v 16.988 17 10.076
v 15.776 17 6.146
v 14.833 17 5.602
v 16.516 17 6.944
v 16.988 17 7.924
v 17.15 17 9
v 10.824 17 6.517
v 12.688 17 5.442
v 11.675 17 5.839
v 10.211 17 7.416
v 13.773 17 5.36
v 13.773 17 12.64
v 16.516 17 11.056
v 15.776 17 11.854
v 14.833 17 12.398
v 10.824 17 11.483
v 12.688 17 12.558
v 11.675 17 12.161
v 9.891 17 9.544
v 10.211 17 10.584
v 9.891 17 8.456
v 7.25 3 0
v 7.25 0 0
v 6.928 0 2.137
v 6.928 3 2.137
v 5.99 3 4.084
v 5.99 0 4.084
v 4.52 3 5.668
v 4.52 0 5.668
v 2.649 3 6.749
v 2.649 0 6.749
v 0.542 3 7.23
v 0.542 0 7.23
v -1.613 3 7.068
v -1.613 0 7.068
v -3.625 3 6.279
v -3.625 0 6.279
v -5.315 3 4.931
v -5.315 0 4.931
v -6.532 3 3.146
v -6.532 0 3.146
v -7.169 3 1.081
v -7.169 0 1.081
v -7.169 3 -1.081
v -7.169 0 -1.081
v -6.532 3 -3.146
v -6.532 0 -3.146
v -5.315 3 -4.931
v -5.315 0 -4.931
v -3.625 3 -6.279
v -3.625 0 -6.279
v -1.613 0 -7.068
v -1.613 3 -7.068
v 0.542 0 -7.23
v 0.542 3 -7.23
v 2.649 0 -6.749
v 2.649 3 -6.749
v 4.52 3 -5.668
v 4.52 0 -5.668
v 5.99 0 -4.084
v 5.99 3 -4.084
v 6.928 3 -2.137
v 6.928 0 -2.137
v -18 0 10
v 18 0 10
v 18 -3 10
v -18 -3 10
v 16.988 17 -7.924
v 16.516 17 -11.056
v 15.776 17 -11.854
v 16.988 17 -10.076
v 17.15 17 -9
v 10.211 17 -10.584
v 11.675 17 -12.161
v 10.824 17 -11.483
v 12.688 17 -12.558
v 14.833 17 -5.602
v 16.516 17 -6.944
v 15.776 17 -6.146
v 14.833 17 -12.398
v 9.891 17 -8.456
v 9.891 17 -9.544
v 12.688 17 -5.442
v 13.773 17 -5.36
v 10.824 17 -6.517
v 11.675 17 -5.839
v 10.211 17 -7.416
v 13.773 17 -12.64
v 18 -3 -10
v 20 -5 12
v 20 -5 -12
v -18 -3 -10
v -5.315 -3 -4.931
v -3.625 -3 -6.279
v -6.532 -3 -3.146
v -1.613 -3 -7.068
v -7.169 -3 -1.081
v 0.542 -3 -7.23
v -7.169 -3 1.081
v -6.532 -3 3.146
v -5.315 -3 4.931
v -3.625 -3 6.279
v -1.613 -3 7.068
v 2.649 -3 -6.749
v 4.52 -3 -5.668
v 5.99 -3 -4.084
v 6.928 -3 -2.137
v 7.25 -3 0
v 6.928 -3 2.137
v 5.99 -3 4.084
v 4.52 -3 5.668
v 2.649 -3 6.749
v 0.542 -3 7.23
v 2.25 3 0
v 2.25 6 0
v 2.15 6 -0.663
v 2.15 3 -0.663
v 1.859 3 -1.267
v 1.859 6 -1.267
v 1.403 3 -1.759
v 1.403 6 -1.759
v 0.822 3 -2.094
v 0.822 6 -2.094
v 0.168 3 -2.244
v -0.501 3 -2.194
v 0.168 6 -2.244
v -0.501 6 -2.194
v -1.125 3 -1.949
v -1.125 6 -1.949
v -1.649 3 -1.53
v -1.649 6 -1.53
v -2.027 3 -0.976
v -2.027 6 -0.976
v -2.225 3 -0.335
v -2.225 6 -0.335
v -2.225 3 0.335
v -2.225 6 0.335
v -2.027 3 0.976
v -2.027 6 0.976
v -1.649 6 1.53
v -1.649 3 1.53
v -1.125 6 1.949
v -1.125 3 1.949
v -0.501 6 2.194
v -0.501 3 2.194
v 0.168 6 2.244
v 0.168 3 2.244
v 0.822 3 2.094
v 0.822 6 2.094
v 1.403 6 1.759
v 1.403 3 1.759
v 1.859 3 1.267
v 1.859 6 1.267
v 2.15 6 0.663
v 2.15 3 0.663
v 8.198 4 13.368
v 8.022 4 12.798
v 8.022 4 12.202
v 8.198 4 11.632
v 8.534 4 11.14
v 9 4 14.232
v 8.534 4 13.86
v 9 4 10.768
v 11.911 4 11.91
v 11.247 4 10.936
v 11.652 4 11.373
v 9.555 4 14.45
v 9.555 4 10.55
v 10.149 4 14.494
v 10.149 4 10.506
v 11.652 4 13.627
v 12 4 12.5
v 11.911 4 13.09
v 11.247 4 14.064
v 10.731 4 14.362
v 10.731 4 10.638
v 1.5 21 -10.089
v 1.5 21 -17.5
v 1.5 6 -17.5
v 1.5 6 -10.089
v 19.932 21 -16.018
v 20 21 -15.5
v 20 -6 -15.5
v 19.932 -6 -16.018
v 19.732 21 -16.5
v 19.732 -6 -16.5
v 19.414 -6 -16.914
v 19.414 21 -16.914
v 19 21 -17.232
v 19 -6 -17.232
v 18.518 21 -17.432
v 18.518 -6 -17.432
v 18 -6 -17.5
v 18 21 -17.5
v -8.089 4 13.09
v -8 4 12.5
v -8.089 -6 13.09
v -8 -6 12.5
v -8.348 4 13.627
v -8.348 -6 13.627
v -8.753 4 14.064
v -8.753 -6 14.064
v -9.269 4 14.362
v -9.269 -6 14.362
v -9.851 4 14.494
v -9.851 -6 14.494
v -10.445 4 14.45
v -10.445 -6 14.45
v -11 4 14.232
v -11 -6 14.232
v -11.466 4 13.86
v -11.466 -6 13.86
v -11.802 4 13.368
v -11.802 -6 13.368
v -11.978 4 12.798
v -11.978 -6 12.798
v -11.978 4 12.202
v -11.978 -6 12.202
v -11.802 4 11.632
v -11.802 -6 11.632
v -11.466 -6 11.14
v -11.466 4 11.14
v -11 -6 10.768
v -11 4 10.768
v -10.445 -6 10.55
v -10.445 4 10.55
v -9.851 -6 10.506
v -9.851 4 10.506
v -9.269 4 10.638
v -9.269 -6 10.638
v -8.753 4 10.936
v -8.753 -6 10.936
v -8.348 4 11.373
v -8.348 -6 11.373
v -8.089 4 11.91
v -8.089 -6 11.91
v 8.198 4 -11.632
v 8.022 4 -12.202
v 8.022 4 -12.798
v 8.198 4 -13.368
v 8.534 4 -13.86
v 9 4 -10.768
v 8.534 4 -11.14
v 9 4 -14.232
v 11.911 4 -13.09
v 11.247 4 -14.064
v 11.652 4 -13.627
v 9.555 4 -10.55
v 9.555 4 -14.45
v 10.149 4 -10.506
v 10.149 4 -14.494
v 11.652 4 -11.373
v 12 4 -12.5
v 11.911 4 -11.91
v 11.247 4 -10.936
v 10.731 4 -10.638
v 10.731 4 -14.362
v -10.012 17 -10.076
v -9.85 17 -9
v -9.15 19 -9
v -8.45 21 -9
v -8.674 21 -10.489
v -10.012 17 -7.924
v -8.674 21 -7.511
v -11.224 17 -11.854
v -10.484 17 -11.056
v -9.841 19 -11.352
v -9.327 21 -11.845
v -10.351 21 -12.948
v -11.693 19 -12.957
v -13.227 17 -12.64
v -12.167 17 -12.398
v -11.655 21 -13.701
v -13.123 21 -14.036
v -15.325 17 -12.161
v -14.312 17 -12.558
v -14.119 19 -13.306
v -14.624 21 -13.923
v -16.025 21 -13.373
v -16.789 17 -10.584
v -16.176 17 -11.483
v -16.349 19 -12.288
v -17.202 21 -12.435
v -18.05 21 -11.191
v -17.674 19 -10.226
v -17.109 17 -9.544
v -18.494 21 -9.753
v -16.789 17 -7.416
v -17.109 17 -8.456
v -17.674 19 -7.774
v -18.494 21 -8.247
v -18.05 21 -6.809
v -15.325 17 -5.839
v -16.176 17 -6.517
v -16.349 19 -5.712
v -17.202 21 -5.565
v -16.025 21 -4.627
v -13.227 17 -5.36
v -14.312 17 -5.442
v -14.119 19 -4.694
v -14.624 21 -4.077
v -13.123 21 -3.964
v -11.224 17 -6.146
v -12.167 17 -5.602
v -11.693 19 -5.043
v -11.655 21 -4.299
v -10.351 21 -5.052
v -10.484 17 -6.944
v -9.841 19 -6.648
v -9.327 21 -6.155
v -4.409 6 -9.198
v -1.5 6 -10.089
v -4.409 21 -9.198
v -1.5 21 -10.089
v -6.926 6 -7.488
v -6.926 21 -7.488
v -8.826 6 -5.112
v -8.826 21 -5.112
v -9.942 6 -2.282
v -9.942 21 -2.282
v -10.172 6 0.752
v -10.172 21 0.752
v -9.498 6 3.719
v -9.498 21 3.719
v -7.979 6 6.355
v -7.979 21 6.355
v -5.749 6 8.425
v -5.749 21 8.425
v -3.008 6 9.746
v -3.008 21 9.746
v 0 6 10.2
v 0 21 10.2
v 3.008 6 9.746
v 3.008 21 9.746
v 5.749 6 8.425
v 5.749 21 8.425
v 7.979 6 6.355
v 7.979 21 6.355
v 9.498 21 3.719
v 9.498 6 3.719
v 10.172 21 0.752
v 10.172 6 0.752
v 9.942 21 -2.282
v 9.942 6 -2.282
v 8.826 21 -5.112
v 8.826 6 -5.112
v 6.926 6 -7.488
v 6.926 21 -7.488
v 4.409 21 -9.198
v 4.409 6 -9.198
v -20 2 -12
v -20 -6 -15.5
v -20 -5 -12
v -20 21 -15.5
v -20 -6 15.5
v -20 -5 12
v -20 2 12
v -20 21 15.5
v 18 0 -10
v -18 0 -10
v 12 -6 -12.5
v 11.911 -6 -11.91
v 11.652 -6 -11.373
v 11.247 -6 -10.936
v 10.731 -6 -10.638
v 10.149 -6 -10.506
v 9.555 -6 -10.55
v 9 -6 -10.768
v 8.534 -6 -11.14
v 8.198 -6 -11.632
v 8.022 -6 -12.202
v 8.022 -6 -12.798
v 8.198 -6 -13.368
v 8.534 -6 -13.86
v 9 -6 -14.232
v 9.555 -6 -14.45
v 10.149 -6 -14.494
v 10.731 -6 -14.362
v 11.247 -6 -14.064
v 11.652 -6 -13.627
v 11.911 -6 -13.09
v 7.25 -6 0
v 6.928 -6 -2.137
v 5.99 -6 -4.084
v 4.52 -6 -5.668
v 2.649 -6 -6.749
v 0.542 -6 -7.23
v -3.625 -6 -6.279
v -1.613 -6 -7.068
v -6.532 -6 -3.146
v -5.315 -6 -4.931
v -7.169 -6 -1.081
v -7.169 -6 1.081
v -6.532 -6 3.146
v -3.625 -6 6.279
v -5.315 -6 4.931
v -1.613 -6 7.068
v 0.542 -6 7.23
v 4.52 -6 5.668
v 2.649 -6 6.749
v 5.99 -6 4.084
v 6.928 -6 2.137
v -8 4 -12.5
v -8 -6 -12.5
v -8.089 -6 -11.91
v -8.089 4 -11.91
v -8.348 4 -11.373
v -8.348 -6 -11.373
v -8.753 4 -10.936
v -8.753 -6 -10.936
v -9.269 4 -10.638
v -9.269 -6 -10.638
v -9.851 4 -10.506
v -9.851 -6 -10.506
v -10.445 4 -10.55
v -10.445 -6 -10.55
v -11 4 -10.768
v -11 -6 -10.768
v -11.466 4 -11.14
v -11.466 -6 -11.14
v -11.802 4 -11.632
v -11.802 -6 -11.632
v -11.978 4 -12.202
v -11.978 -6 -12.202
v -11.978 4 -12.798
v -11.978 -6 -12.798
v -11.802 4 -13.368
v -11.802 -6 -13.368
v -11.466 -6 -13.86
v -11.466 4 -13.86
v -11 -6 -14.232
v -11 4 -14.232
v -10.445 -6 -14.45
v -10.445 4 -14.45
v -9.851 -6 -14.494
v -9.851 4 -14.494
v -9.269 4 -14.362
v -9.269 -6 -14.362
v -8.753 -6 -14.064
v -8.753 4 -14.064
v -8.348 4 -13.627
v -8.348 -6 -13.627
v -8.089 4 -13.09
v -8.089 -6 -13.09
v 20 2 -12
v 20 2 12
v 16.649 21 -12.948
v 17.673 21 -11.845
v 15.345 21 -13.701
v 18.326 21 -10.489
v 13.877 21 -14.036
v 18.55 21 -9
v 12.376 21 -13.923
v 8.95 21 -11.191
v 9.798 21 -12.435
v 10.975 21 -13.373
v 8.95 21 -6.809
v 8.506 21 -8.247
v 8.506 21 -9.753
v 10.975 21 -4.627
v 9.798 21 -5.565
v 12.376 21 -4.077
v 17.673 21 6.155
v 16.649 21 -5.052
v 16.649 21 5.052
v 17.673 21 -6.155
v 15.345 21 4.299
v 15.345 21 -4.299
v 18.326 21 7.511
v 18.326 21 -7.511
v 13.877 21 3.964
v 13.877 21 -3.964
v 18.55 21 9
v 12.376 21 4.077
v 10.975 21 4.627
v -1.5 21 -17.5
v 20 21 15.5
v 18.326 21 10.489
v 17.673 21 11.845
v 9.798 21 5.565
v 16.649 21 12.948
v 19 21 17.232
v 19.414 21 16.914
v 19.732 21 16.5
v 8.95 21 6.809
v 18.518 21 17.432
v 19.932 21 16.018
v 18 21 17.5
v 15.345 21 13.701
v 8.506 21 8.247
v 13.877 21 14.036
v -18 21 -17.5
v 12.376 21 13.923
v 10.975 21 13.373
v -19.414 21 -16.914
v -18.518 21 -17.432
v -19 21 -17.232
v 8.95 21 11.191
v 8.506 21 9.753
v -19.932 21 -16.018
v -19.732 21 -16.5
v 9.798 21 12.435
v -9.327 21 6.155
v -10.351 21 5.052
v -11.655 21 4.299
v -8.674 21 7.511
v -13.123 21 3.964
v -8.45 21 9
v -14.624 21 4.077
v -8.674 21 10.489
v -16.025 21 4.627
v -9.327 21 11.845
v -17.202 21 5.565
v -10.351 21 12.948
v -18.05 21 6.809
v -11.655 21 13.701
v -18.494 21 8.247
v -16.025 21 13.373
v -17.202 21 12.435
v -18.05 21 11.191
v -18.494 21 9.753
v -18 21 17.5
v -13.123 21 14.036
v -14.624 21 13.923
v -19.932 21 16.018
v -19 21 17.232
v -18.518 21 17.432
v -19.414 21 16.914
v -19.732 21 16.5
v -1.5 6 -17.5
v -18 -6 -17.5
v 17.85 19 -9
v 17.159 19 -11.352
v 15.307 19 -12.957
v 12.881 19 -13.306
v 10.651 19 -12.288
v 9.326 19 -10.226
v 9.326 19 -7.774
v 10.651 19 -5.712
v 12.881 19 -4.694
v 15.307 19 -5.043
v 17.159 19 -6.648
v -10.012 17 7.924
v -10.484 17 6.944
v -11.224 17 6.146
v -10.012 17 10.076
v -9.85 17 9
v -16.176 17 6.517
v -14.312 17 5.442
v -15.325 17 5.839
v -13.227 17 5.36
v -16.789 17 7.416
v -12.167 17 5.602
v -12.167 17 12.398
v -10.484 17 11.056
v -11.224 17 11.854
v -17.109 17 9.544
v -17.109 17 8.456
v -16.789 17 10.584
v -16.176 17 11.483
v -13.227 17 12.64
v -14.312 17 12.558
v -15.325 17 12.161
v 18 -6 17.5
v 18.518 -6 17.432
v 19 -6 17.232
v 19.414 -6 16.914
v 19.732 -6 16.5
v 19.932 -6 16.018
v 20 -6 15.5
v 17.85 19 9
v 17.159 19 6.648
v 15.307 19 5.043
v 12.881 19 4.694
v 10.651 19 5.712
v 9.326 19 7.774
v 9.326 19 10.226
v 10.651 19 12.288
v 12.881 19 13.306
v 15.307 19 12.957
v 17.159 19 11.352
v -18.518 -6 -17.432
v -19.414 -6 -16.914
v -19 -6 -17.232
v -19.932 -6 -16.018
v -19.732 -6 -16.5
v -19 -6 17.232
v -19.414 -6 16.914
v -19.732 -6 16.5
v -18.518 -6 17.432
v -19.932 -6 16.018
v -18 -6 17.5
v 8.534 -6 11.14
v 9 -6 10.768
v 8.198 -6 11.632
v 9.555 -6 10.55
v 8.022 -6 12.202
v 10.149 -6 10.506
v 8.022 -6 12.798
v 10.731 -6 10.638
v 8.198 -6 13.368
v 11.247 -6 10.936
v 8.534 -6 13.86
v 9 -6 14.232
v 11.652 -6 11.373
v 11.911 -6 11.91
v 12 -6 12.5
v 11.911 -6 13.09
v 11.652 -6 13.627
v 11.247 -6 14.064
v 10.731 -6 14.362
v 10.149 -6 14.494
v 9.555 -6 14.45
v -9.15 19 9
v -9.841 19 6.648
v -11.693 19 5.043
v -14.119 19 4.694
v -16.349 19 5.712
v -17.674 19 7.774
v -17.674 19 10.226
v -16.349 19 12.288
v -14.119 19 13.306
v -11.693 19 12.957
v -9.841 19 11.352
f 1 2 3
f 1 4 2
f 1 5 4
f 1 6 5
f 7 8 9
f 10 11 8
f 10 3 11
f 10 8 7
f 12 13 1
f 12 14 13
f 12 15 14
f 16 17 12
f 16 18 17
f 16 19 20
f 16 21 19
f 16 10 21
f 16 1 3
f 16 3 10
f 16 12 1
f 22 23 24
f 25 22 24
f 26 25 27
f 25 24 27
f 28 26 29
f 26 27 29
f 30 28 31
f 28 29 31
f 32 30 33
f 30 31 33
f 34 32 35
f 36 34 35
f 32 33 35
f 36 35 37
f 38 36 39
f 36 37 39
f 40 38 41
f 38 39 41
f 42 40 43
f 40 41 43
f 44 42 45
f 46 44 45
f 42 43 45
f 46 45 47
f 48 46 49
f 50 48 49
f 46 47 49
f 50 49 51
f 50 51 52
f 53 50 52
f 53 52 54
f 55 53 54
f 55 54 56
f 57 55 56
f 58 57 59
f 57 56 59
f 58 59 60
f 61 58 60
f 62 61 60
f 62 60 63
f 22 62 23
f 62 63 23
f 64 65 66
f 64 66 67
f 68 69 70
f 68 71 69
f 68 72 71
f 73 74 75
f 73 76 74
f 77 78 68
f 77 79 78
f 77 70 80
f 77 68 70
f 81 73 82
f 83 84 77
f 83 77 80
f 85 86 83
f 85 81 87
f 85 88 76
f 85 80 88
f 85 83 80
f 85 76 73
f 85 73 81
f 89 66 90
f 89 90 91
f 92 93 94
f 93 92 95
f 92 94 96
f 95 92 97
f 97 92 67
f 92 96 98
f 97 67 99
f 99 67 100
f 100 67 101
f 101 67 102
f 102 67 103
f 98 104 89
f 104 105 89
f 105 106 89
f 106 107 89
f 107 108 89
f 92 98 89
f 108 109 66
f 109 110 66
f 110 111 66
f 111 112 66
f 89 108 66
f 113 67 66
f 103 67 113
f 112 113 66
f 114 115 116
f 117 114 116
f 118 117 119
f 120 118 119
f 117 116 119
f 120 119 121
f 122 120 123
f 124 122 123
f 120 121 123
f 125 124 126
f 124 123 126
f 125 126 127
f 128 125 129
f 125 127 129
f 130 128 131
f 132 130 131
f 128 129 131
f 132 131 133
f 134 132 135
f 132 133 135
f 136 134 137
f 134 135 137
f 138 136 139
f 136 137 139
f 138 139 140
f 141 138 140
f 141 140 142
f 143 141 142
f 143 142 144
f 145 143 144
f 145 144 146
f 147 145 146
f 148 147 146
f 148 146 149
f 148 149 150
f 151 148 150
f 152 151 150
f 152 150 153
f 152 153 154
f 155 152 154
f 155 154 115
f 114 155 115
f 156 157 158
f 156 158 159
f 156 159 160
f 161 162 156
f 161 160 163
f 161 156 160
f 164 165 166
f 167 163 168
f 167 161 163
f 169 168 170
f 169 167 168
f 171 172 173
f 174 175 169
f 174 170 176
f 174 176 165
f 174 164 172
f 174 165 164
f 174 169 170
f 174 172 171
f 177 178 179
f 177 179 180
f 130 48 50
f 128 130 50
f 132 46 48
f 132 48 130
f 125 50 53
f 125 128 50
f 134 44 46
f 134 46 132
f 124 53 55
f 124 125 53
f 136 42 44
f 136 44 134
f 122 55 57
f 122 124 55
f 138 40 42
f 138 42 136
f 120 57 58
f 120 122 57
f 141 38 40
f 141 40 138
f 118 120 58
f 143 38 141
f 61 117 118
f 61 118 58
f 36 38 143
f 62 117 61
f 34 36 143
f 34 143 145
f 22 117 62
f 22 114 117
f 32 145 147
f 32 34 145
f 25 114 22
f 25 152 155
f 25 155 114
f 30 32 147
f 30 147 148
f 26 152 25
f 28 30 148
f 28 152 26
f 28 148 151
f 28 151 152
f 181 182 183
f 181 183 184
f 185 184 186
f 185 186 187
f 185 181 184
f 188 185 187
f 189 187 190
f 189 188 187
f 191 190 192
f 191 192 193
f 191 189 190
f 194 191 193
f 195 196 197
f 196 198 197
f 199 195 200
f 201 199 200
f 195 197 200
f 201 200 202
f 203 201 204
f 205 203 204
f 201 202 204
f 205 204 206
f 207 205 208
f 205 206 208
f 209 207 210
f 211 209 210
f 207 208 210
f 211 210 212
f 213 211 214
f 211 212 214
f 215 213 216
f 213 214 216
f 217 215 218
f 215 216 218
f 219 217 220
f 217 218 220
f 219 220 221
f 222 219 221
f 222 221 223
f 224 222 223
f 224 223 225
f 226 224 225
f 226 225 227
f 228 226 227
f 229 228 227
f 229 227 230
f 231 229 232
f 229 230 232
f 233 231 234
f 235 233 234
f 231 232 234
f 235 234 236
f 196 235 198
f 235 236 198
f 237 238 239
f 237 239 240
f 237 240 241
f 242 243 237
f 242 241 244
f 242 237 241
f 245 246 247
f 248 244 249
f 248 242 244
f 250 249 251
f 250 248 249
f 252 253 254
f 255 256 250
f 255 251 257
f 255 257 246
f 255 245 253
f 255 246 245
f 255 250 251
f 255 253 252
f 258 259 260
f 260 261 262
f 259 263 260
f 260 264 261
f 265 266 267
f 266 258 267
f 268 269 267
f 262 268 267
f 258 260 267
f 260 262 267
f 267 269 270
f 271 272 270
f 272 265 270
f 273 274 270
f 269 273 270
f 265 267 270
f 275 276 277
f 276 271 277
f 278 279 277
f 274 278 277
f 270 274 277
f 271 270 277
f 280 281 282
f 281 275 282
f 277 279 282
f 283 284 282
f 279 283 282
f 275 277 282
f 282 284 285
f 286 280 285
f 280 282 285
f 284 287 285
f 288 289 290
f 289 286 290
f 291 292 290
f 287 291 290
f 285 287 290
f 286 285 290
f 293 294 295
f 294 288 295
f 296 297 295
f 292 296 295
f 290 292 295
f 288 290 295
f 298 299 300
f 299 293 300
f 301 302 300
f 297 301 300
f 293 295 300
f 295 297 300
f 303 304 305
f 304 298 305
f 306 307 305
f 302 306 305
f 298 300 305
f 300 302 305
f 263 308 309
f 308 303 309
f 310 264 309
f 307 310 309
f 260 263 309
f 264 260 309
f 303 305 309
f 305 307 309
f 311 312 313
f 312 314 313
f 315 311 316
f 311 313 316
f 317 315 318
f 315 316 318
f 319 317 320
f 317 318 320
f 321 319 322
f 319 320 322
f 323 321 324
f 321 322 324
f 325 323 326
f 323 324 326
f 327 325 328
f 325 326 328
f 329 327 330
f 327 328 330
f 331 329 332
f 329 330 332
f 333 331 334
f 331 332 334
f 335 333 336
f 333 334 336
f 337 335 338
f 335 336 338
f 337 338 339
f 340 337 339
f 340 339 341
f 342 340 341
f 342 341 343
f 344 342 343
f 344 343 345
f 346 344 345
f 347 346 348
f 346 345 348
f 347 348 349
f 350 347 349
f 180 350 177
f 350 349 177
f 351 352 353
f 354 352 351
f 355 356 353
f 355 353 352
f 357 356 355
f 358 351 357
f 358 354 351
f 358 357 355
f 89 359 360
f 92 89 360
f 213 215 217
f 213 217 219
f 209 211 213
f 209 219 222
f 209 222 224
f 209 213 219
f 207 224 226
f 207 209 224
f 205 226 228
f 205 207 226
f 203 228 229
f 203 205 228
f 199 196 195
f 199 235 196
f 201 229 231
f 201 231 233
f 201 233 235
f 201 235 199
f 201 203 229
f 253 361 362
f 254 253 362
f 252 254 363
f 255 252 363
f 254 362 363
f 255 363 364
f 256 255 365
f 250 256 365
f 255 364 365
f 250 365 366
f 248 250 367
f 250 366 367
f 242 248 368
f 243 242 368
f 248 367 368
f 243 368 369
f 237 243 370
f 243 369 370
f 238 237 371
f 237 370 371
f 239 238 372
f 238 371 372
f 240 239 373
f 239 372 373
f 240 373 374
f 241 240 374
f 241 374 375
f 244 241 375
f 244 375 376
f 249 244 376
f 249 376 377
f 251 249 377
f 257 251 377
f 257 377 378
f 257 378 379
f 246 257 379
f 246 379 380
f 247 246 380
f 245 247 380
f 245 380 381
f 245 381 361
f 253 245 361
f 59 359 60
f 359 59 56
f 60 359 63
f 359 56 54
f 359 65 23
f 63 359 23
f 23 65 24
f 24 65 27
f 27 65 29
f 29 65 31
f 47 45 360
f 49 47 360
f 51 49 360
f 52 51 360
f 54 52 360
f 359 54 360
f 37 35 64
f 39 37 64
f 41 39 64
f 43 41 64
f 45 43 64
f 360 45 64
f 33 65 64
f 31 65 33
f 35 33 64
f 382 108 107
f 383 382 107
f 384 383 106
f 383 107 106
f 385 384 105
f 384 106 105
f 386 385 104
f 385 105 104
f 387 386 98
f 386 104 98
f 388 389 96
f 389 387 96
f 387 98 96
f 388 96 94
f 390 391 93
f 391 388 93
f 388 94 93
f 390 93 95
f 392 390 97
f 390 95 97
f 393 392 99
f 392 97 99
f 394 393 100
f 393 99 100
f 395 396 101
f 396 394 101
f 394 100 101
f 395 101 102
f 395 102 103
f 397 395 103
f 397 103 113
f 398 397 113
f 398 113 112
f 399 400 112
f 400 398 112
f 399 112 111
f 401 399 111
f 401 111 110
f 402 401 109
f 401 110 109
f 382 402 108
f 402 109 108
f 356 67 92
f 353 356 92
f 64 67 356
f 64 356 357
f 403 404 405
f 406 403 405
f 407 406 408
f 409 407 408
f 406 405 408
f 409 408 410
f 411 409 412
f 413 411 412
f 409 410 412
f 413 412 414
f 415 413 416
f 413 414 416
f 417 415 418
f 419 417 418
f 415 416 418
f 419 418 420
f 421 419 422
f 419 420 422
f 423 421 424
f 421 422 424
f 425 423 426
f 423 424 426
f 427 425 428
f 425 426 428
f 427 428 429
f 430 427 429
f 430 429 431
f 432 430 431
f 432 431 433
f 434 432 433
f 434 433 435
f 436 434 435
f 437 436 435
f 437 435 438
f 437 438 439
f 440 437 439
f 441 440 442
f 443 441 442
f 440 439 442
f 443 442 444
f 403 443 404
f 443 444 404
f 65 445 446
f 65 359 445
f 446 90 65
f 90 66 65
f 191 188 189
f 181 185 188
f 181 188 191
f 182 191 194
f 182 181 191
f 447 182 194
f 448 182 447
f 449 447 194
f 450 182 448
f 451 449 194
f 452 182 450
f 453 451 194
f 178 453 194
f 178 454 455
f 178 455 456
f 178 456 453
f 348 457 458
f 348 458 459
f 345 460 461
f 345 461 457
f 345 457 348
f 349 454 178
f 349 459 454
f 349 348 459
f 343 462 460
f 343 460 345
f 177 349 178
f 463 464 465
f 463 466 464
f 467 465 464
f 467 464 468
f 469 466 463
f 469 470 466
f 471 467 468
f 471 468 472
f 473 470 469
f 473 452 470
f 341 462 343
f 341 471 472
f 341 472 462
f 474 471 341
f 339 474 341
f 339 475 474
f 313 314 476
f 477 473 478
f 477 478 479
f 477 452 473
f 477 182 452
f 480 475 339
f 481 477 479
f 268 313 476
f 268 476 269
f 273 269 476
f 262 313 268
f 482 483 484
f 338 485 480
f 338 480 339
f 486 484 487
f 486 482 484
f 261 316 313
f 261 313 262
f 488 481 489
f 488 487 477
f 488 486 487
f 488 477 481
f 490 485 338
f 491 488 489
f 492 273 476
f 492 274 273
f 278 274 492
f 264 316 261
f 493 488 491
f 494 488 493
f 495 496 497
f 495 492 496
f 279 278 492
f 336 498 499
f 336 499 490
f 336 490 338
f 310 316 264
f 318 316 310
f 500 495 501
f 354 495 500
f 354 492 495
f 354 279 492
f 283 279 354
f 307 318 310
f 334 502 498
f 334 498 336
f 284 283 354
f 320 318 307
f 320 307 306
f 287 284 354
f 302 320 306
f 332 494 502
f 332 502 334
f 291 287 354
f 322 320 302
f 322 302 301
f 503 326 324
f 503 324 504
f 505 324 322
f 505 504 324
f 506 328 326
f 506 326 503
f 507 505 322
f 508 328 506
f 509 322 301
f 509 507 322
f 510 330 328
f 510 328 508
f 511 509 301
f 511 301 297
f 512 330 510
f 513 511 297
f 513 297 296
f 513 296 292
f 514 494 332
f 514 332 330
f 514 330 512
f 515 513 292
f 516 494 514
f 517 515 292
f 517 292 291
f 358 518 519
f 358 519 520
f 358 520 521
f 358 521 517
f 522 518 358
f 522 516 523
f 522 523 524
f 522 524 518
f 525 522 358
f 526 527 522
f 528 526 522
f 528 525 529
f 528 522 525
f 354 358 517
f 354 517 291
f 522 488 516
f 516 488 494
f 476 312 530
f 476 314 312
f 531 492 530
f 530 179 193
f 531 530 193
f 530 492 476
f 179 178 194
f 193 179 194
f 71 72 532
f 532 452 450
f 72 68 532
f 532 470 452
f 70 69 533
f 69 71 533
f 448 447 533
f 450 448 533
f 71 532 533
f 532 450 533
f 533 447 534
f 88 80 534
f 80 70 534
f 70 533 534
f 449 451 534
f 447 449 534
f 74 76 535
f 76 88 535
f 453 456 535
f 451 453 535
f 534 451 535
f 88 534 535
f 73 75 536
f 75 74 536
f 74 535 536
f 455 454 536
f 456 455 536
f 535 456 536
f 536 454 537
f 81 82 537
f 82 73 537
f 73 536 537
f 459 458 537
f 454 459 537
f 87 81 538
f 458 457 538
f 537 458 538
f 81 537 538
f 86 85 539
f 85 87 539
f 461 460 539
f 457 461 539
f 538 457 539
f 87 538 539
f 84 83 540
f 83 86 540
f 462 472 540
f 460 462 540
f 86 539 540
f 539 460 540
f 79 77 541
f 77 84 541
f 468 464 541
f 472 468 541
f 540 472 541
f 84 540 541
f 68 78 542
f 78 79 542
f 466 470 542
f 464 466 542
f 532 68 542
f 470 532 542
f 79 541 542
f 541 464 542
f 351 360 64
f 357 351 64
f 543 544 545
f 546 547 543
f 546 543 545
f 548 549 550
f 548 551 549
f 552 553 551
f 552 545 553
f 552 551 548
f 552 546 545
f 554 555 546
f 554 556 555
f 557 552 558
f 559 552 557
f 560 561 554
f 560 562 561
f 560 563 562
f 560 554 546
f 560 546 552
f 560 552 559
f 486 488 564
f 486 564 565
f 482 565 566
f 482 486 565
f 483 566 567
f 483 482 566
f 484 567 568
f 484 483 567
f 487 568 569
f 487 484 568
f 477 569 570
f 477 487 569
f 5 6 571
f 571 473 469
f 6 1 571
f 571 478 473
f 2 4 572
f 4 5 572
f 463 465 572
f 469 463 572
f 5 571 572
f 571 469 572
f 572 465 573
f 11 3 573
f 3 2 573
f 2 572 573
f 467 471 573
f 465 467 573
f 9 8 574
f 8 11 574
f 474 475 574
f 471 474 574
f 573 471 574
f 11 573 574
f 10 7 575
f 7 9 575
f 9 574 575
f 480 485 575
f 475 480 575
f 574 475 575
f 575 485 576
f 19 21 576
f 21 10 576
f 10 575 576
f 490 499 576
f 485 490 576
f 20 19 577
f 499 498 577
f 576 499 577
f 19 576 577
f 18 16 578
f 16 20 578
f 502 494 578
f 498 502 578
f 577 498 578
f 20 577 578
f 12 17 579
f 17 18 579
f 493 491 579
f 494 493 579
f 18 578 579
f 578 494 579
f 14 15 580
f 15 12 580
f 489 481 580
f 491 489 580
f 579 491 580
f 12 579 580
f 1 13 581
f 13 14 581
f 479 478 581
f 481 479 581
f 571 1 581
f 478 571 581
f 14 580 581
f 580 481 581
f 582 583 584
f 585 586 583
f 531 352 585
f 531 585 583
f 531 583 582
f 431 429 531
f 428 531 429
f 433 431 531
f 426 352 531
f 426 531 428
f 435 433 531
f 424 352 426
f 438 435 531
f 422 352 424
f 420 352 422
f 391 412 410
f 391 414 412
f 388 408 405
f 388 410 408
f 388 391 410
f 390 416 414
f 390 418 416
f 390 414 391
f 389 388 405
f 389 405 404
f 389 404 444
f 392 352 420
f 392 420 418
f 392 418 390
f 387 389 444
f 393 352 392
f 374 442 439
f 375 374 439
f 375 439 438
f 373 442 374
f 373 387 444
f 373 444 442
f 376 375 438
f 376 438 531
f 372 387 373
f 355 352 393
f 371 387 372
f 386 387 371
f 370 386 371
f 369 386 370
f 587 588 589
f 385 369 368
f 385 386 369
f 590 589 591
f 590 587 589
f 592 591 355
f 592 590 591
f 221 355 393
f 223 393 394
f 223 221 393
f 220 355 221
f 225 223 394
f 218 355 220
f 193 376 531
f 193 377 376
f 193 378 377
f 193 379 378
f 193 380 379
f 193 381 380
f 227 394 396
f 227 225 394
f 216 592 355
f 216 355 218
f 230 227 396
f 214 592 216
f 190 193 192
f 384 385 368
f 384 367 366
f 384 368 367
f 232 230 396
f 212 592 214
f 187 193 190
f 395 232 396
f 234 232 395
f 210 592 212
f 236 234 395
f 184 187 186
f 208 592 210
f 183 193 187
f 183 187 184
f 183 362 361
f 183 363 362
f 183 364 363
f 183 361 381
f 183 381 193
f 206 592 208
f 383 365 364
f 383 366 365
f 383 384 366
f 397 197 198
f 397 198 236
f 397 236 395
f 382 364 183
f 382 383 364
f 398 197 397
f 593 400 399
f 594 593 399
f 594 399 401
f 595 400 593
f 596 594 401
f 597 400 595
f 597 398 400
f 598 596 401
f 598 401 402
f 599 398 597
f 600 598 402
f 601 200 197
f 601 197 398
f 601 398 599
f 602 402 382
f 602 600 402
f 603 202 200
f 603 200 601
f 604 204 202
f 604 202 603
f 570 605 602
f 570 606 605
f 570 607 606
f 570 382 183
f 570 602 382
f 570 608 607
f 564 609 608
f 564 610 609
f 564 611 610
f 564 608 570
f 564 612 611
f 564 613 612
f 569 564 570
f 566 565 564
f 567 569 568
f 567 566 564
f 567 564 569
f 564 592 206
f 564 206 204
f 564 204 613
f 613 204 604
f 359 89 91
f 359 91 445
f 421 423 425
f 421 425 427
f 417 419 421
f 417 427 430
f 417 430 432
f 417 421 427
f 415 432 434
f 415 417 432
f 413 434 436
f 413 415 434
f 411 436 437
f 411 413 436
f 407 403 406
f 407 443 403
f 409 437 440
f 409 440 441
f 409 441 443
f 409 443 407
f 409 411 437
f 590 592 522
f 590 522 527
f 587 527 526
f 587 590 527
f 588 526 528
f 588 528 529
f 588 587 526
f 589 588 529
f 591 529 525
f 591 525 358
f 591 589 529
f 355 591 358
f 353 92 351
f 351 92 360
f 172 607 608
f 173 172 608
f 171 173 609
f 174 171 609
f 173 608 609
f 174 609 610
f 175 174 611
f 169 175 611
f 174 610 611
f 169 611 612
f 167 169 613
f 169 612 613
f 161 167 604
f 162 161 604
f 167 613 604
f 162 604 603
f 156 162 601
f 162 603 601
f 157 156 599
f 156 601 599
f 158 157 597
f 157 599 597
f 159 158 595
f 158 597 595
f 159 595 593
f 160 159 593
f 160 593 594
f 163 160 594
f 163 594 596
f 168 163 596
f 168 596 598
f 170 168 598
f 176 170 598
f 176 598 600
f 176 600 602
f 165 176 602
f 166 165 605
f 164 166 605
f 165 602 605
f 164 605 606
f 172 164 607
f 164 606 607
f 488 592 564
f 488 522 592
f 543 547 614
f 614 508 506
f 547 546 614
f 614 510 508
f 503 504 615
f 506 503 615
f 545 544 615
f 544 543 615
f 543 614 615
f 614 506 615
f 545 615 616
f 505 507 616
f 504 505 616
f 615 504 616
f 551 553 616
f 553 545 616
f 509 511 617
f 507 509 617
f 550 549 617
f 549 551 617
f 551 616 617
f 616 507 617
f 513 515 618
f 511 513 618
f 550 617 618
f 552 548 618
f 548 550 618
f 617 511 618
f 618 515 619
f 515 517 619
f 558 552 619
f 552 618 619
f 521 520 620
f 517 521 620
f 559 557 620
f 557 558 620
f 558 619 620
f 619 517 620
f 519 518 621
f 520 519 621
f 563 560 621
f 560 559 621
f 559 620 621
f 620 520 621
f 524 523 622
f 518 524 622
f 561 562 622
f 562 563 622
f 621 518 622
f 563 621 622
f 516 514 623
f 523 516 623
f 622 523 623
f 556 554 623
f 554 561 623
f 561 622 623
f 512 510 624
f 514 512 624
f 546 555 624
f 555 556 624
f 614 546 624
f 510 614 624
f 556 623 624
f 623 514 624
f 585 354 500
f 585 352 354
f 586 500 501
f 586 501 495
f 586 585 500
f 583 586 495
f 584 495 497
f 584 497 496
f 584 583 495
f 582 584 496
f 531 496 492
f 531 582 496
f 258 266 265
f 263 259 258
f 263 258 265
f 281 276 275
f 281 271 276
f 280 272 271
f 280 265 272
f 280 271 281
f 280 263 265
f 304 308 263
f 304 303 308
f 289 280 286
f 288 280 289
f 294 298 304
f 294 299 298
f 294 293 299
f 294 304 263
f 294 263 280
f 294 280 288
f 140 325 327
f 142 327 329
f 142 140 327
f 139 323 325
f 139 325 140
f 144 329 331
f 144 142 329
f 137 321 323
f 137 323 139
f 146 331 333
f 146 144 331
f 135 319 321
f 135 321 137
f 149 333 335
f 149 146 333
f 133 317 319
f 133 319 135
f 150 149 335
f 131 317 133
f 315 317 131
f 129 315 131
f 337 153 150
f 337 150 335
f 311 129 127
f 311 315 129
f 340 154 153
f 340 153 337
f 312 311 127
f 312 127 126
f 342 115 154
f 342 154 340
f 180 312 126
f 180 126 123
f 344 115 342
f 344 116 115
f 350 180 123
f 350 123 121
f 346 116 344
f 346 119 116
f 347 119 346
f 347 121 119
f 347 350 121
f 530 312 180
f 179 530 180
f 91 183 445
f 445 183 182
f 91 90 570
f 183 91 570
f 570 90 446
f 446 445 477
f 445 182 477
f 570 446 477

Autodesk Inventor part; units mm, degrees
ref_plane "YZ Plane" through (0, 0, 0) normal (1, 0, 0) x (0, 1, 0)
ref_plane "XY Plane" through (0, 0, 0) normal (0, 0, 1) x (1, 0, 0)
sketch "Sketch1" plane through (0, 0, 0) normal (0, 1, 0) x (-1, 0, 0)
  line L0 (-20, 17.5) -> (20, 17.5)
  line L1 (20, 17.5) -> (20, -17.5)
  line L2 (20, -17.5) -> (-20, -17.5)
  line L3 (-20, -17.5) -> (-20, 17.5)
  line L4 (-20, 17.5) -> (20, -17.5) construction
  line L5 (20, 17.5) -> (-20, -17.5) construction
  point P0 (0, 0)
  dimension "d0" = 35
  dimension "d1" = 40
extrude "Extrusion1" add sketch "Sketch1" along normal blind 21
sketch "Sketch2" plane through (0, 21, 0) normal (0, 1, 0) x (1, 0, 0)
  circle A0 centre (0, 0) radius 10.2
  line L0 (-1.5, 10.0891) -> (-1.5, 17.5)
  line L1 (-1.5, 17.5) -> (1.5, 17.5)
  line L2 (20, 17.5) -> (-20, 17.5) projected
  line L3 (1.5, 17.5) -> (1.5, 10.0891)
  line L4 (0, 0) -> (0, 17.5) construction
  dimension "d4" = 20.4
  dimension "d7" = 3
extrude "Extrusion2" cut sketch "Sketch2" against normal blind 15
sketch "Sketch3" plane through (0, 6, 0) normal (0, 1, 0) x (1, 0, 0)
  circle A0 centre (0, 0) radius 2.25
  dimension "d8" = 4.5
extrude "Extrusion3" cut sketch "Sketch3" against normal through all
sketch "Sketch5" plane through (0, 0, 0) normal (0, -1, 0) x (1, 0, 0)
  circle A0 centre (0, 0) radius 7.25
  dimension "d11" = 14.5
extrude "Extrusion4" cut sketch "Sketch5" against normal blind 3
sketch "Sketch6" plane through (0, 21, 0) normal (0, 1, 0) x (1, 0, 0)
  line L0 (-13.5, -9) -> (13.5, -9) construction
  line L1 (13.5, -9) -> (13.5, 9) construction
  line L2 (13.5, 9) -> (-13.5, 9) construction
  line L3 (-13.5, 9) -> (-13.5, -9) construction
  line L4 (-13.5, -9) -> (13.5, 9) construction
  line L5 (13.5, -9) -> (-13.5, 9) construction
  circle A0 centre (-13.5, 9) radius 5.05
  circle A1 centre (13.5, 9) radius 5.05
  circle A2 centre (13.5, -9) radius 5.05
  circle A3 centre (-13.5, -9) radius 5.05
  point P0 (0, 0)
  dimension "d14" = 18
  dimension "d15" = 27
  dimension "d16" = 10.1
ref_plane "Work Plane1" through (0, 17, 0) normal (0, 1, 0) x (-1, 0, 0)
sketch "Sketch7" plane through (0, 17, 0) normal (0, 1, 0) x (-1, 0, 0)
  circle A0 centre (13.5, -9) radius 3.65
  circle A1 centre (-13.5, -9) radius 3.65
  circle A2 centre (-13.5, 9) radius 3.65
  circle A3 centre (13.5, 9) radius 3.65
  line L0 (13.5, 9) -> (-13.5, 9) construction
  line L1 (-13.5, 9) -> (-13.5, -9) construction
  line L2 (-13.5, -9) -> (13.5, -9) construction
  line L3 (13.5, -9) -> (13.5, 9) construction
  line L4 (13.5, 9) -> (-13.5, -9) construction
  line L5 (-13.5, 9) -> (13.5, -9) construction
  point P0 (0, 0)
  dimension "d20" = 7.3
  dimension "d21" = 27
  dimension "d22" = 18
loft "Loft2" cut profiles "Sketch6", "Sketch7" contours A0 / A0
loft "Loft3" cut profiles "Sketch6", "Sketch7" contours A3 / A3
loft "Loft4" cut profiles "Sketch6", "Sketch7" contours A1 / A1
loft "Loft5" cut profiles "Sketch6", "Sketch7" contours A2 / A2
sketch "Sketch8" plane through (0, 0, 0) normal (0, -1, 0) x (1, 0, 0)
  line L0 (-20, -17.5) -> (20, -17.5)
  line L1 (20, -17.5) -> (20, -10)
  line L2 (-20, -10) -> (-20, -17.5)
  line L3 (-20, 17.5) -> (20, 17.5)
  line L4 (20, 17.5) -> (20, 10)
  line L5 (-20, 10) -> (-20, 17.5)
  line L6 (20, 10) -> (-20, 10)
  line L7 (20, -10) -> (-20, -10)
  point P0 (0, 0)
  dimension "d50" = 20
extrude "Extrusion6" add sketch "Sketch8" along normal blind 3
sketch "Sketch9" plane through (0, -3, 0) normal (0, -1, 0) x (1, 0, 0)
  line L0 (-20, 17.5) -> (20, 17.5) projected
  line L1 (-20, -17.5) -> (-20, 17.5) projected
  line L2 (20, 17.5) -> (-20, 17.5)
  line L3 (-20, 17.5) -> (-20, -17.5)
  line L4 (-20, -17.5) -> (20, -17.5)
  line L5 (20, -17.5) -> (20, 17.5)
  circle A0 centre (0, 0) radius 7.25
  arc A1 (7.25, 0) -> (7.25, 0) centre (0, 0) ccw projected
extrude "Extrusion7" add sketch "Sketch9" along normal blind 3
fillet "Fillet1" radius 2 4 edges at (-20, 7.5, -17.5) (-20, 7.5, 17.5) (20, 7.5, -17.5) (20, 7.5, 17.5)
chamfer "Chamfer1" distance 2 angle 45 8 edges at (-20, -3, 0) (-20, -1.5, -10) (-20, 0, 0) (-20, -1.5, 10) (20, 0, 0) (20, -1.5, 10) (20, -3, 0) (20, -1.5, -10)
sketch "Sketch10" plane through (0, -6, 0) normal (0, -1, 0) x (1, 0, 0)
  line L0 (10, 12.5) -> (-10, 12.5) construction
  line L1 (-10, 12.5) -> (-10, -12.5) construction
  line L2 (-10, -12.5) -> (10, -12.5) construction
  line L3 (10, -12.5) -> (10, 12.5) construction
  line L4 (10, 12.5) -> (-10, -12.5) construction
  line L5 (-10, 12.5) -> (10, -12.5) construction
  circle A0 centre (10, -12.5) radius 2
  circle A1 centre (10, 12.5) radius 2
  circle A2 centre (-10, 12.5) radius 2
  circle A3 centre (-10, -12.5) radius 2
  point P0 (0, 0)
  dimension "d55" = 20
  dimension "d56" = 25
  dimension "d57" = 4
extrude "Extrusion8" cut sketch "Sketch10" against normal blind 10
properties part number "Electromagnet Blocl" material "ABS Plastic"
